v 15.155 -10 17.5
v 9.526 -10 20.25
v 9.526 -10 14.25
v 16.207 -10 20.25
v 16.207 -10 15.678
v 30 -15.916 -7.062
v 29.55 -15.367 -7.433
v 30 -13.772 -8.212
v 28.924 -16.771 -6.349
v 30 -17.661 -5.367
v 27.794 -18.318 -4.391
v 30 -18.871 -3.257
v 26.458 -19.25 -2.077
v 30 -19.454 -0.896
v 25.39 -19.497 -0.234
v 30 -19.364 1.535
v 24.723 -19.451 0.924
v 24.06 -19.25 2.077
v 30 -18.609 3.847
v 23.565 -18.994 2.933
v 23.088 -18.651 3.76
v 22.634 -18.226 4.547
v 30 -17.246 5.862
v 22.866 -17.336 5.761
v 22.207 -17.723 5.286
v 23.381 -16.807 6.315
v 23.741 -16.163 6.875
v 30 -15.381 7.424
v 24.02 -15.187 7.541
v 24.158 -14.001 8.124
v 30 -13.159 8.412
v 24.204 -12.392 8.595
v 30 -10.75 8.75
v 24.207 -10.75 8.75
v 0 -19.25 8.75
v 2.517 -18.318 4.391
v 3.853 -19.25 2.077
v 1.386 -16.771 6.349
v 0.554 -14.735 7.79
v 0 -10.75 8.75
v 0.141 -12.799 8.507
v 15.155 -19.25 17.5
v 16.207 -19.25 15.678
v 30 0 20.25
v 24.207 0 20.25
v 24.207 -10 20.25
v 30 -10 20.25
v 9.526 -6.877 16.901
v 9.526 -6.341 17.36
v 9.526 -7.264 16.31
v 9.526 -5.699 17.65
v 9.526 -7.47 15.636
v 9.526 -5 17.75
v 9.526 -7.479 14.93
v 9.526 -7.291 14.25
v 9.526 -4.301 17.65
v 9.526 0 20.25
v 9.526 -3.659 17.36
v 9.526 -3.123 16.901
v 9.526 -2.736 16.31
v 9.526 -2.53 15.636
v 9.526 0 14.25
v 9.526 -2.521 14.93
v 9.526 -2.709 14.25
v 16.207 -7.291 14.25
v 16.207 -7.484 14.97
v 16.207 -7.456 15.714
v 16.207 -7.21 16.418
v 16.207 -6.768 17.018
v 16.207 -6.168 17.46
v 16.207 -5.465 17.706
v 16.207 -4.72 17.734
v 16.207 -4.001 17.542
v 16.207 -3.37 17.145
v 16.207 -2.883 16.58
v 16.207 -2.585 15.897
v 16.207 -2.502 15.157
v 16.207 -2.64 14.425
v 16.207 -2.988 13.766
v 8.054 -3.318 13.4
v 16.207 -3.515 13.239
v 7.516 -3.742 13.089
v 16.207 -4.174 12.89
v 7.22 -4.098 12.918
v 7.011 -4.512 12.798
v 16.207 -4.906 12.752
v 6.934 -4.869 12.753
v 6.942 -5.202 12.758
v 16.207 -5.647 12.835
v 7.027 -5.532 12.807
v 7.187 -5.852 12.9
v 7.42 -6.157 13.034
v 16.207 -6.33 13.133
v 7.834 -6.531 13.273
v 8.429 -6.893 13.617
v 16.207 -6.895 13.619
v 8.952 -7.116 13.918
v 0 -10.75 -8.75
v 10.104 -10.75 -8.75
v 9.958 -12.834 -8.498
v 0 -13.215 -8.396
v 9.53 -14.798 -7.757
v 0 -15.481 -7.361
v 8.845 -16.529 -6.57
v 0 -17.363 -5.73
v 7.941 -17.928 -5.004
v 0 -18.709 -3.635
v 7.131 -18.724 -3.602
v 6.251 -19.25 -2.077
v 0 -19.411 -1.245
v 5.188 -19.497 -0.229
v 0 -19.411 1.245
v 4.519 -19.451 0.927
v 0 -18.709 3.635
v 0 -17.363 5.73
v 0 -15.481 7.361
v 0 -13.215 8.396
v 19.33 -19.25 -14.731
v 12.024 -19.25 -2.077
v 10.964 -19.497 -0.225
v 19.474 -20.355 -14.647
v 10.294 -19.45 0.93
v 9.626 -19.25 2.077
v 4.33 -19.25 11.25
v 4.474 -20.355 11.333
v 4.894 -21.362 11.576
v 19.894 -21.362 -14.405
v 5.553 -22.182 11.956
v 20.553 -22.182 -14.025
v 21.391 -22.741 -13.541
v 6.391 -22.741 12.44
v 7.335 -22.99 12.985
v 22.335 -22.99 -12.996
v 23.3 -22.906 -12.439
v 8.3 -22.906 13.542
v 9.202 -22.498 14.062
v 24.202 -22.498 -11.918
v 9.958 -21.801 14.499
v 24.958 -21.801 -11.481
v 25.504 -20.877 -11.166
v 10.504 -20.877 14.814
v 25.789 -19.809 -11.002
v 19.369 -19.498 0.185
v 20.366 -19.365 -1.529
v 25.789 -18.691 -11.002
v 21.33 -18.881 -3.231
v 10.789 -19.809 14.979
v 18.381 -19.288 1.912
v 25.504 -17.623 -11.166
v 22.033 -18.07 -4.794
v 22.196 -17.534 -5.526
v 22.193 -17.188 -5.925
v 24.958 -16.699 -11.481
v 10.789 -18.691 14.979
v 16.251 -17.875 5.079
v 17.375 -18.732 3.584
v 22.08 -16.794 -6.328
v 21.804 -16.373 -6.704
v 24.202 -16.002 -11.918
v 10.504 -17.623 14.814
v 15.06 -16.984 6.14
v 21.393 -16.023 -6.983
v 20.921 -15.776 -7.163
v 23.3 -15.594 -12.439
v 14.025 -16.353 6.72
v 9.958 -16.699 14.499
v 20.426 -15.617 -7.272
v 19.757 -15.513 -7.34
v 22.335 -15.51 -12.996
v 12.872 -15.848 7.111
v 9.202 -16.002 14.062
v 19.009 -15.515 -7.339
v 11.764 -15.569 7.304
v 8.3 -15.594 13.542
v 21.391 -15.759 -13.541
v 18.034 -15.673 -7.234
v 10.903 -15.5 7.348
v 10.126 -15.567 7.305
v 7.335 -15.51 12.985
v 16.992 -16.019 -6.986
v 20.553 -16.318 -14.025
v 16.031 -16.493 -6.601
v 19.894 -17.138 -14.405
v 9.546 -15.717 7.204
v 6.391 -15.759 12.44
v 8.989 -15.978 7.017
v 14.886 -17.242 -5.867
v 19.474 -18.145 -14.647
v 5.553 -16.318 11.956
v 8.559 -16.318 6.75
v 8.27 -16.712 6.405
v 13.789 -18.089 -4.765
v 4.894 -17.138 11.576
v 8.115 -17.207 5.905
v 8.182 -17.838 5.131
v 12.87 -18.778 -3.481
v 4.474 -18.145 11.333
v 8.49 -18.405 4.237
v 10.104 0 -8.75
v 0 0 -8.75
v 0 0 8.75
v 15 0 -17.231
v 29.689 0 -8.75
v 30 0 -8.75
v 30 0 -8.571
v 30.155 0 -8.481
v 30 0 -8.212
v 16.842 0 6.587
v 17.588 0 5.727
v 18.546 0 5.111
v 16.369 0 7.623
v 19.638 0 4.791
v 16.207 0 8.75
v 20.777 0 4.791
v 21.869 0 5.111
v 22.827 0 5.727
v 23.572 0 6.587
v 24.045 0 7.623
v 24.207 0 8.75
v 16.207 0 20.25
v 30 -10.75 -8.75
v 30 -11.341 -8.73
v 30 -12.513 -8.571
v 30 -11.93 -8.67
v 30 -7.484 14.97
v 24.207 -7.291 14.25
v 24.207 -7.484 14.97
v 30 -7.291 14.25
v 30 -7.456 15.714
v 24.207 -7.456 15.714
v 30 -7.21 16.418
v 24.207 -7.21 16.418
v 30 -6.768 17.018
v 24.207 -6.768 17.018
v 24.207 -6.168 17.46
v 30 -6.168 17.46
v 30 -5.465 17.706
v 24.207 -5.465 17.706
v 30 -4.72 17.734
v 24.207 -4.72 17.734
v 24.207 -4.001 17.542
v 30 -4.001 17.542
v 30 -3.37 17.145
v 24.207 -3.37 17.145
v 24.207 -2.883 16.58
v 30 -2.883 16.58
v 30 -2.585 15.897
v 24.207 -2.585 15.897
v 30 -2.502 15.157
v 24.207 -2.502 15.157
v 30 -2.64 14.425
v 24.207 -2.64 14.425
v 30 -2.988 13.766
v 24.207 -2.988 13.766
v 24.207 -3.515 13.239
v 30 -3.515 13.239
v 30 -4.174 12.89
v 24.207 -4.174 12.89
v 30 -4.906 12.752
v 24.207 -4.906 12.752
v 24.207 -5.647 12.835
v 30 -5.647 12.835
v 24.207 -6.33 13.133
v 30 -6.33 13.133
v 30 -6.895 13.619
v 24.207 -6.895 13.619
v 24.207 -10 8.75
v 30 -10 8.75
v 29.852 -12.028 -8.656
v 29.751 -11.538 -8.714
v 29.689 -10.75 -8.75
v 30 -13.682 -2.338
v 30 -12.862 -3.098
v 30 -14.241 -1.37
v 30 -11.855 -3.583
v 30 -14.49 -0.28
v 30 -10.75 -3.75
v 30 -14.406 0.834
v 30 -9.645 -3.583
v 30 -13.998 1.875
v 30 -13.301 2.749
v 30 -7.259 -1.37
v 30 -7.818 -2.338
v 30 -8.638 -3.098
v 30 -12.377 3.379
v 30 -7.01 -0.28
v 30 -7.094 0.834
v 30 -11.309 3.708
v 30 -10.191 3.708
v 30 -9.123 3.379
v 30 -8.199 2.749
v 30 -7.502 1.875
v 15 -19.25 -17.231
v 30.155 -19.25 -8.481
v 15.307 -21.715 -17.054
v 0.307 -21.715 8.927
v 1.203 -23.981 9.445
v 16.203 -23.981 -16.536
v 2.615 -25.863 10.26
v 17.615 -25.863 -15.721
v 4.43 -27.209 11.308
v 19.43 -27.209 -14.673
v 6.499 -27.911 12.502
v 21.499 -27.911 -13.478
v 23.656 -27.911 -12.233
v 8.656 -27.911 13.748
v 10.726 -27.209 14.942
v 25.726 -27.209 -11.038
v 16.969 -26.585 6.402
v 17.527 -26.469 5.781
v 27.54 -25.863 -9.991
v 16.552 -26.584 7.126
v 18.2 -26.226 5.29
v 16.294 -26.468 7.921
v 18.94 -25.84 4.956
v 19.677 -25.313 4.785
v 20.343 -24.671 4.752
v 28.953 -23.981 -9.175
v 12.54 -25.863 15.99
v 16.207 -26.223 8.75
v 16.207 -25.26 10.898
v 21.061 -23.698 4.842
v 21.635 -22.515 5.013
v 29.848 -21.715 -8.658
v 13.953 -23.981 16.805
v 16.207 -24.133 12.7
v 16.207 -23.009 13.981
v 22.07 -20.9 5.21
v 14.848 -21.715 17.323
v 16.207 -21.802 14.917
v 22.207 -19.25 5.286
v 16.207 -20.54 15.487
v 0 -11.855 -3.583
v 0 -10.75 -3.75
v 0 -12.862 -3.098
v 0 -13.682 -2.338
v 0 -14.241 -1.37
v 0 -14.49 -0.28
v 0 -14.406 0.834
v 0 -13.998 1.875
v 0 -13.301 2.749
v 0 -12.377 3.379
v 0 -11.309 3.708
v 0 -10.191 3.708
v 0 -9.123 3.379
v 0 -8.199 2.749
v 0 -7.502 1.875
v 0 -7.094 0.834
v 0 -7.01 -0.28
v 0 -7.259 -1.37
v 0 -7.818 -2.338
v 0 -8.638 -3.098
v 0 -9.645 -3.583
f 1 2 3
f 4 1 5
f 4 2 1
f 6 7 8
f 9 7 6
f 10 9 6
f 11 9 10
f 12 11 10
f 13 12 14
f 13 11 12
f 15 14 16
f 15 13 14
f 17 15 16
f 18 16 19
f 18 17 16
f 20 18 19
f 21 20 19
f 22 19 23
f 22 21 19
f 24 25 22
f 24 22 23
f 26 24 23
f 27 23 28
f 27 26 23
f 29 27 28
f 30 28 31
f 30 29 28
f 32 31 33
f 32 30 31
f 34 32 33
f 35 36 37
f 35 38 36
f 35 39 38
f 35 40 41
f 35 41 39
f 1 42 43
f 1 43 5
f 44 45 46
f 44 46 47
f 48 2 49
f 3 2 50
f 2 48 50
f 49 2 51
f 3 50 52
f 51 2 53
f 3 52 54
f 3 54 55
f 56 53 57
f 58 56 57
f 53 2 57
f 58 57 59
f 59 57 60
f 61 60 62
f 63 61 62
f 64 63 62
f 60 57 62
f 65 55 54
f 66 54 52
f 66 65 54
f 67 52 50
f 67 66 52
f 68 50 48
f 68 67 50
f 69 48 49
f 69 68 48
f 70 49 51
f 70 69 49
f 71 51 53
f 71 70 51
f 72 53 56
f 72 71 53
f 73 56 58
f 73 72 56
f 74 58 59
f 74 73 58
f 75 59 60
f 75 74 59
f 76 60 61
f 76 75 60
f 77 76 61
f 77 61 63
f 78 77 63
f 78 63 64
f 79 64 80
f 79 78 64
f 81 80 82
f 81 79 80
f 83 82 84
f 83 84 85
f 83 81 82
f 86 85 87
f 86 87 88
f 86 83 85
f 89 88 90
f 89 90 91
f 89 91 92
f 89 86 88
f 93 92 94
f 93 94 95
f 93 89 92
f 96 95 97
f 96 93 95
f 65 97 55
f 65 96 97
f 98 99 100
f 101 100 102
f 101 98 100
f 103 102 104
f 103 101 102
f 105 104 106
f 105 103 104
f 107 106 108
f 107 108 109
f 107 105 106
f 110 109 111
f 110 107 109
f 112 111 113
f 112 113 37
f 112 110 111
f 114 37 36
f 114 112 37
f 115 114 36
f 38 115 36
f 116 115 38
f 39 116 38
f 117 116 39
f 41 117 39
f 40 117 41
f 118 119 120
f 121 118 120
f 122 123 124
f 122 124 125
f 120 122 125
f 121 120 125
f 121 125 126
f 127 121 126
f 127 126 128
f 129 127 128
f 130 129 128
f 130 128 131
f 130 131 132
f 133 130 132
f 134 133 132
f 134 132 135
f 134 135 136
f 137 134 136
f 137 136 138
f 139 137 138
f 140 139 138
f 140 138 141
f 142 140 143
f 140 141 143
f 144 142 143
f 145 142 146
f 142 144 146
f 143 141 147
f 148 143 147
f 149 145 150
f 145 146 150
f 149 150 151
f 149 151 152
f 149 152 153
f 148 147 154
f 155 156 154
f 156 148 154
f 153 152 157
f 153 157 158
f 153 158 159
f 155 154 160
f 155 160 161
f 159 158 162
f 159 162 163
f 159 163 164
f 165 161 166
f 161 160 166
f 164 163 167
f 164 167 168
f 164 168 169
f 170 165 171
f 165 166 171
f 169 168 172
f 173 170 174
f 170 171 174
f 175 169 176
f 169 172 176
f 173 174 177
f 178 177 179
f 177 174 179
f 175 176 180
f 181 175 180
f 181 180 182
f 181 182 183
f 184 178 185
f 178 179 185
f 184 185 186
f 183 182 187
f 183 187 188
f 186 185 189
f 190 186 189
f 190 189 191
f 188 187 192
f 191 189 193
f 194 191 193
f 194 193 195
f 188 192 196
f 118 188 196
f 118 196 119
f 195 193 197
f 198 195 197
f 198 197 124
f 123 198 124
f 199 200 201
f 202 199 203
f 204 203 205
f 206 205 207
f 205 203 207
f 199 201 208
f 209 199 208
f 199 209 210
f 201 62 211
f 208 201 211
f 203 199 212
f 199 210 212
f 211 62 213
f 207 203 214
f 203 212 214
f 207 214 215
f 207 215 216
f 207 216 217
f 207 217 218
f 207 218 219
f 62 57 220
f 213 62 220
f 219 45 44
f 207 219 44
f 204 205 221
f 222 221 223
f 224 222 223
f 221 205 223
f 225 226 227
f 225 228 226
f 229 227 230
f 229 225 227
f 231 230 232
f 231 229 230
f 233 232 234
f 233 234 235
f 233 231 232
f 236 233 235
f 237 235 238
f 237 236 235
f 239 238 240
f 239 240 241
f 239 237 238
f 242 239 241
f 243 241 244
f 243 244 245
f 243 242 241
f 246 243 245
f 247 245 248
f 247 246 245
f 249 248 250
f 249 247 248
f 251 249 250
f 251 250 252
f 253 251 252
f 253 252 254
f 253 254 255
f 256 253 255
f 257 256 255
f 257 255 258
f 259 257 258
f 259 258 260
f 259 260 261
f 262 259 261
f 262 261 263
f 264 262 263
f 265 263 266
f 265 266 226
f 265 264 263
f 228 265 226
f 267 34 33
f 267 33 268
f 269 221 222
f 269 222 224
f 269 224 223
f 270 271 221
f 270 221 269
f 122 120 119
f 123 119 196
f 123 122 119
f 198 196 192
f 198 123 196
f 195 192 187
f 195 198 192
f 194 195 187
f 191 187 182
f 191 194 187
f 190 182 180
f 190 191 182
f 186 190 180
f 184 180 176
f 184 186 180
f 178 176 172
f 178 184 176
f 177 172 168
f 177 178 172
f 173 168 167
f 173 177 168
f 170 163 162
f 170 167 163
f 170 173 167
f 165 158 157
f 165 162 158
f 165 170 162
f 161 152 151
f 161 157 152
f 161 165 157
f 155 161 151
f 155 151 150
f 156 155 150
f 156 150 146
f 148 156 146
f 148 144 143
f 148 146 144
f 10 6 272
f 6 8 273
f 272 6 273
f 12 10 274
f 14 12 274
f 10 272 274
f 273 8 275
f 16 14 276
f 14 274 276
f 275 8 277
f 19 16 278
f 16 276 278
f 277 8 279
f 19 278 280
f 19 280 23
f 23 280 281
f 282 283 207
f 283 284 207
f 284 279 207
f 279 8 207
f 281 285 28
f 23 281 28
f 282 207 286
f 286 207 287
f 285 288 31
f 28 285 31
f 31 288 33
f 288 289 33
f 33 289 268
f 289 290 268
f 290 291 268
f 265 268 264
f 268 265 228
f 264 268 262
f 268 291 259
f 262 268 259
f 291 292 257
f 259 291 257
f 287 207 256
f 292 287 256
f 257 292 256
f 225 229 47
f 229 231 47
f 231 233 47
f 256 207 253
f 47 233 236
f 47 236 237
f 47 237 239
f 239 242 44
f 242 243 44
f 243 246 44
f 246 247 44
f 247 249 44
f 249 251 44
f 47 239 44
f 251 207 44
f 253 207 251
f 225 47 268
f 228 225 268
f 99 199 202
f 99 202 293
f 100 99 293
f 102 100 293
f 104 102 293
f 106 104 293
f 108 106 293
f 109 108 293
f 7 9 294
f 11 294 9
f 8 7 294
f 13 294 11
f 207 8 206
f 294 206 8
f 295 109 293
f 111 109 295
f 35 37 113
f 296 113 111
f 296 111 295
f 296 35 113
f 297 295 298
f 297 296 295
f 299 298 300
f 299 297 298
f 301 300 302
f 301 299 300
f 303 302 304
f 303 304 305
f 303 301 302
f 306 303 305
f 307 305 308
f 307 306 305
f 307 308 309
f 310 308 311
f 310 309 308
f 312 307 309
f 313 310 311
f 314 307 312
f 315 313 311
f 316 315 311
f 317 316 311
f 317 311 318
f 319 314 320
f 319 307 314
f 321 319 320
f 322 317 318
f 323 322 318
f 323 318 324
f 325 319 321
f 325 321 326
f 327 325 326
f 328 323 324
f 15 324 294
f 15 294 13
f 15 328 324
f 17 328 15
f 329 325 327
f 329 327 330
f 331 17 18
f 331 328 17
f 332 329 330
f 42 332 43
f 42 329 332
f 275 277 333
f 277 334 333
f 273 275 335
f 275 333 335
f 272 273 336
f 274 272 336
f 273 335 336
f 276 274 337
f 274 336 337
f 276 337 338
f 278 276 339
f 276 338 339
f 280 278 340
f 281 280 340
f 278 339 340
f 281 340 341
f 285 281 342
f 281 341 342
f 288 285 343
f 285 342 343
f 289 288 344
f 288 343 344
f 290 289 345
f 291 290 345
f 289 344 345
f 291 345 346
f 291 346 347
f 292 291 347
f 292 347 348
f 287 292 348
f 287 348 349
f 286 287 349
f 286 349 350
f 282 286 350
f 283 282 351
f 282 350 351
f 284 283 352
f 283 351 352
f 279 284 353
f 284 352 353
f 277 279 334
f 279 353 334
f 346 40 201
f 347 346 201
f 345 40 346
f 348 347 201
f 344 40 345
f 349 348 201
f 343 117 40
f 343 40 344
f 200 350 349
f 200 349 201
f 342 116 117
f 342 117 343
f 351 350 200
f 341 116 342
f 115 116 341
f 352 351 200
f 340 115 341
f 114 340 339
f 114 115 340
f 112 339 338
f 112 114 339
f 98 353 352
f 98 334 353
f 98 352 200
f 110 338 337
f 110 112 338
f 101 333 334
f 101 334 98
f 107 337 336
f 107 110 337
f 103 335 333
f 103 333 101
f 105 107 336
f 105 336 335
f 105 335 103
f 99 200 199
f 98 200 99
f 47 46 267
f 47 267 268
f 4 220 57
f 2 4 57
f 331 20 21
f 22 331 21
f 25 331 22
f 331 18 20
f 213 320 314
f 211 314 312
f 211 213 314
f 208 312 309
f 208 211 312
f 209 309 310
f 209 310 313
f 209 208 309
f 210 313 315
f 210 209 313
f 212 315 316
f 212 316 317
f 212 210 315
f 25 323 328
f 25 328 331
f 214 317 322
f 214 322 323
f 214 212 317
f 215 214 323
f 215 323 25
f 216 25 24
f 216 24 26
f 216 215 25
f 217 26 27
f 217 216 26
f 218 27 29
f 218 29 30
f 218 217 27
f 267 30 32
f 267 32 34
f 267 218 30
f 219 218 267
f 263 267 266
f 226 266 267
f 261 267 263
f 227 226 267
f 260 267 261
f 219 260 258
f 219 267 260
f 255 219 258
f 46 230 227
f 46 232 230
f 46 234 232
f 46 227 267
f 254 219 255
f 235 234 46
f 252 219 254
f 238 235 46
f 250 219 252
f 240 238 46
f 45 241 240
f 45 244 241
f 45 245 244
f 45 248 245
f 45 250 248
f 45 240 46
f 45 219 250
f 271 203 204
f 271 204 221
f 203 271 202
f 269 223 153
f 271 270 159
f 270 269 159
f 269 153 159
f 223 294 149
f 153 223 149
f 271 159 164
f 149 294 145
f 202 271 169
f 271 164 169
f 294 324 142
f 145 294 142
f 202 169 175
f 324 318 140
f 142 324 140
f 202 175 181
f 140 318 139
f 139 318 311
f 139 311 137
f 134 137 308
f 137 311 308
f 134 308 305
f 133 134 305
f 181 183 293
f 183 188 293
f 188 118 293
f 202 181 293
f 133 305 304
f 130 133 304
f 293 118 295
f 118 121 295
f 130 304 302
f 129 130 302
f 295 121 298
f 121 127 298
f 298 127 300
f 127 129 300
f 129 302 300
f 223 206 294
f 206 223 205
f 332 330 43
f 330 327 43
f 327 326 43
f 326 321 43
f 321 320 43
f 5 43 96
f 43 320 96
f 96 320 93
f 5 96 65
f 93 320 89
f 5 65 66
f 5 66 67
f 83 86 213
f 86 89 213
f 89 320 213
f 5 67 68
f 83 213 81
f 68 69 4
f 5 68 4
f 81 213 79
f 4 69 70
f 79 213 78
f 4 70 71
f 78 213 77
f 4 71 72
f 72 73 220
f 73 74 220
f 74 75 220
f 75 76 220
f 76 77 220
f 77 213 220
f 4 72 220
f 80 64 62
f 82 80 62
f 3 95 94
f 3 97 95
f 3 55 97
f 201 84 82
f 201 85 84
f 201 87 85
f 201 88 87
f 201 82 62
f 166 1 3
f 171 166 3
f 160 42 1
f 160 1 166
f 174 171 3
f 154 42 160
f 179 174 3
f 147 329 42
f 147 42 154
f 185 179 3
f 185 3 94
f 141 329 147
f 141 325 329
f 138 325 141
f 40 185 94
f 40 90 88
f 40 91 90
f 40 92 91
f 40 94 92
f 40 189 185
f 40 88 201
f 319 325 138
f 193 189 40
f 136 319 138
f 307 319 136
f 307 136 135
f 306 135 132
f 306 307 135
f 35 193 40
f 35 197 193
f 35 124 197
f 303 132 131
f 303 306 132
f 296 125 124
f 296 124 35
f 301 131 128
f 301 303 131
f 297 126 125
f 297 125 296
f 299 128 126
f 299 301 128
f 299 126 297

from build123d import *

# Parameters (mm, degrees)
SKETCH1_R           = 3.75
BOSS_EXTRUDE1_DEPTH = 30
SKETCH2_R           = 3.75
BOSS_EXTRUDE2_DEPTH = 30
CUT_EXTRUDE1_DEPTH  = 29.0000001
SKETCH4_W           = 5.792740578
SKETCH4_H           = 11.5
BOSS_EXTRUDE3_DEPTH = 10
BOSS_EXTRUDE4_DEPTH = 10
SKETCH5_R           = 2.5
CUT_EXTRUDE2_DEPTH  = 31.0000001
SKETCH7_R           = 3.75
CUT_EXTRUDE3_DEPTH  = 31.155444666
SKETCH8_R           = 3.75
CUT_EXTRUDE4_DEPTH  = 38.57772242


with BuildPart() as part:
    # Sketch1 → Boss-Extrude1 (new body)
    with BuildSketch(Plane(origin=(0, 0, 0), x_dir=(0, 0, -1), z_dir=(1, 0, 0))):
        with BuildLine():
            Line((-8.75, 0), (8.75, 0))
            Line((8.75, 0), (8.75, 10.75))
            ThreePointArc((8.75, 10.75), (0, 19.5), (-8.75, 10.75))
            Line((-8.75, 10.75), (-8.75, 0))
        make_face()
        with Locations((0, 10.75)):
            Circle(SKETCH1_R, mode=Mode.SUBTRACT)
    extrude(amount=BOSS_EXTRUDE1_DEPTH)

    # Sketch2 → Boss-Extrude2 (add)
    with BuildSketch(Plane(origin=(-3.788861142, 0, 6.5625), x_dir=(-0.866025404, 0, -0.5), z_dir=(0.5, 0, -0.866025404))):
        with BuildLine():
            Line((-4.375, 0), (-4.375, 19.25))
            ThreePointArc((-4.375, 19.25), (-13.125, 28), (-21.875, 19.25))
            Line((-21.875, 19.25), (-21.875, 0))
            Line((-21.875, 0), (-4.375, 0))
        make_face()
        with Locations((-13.125, 19.25)):
            Circle(SKETCH2_R, mode=Mode.SUBTRACT)
    extrude(amount=BOSS_EXTRUDE2_DEPTH)

    # Sketch3 → Cut-Extrude1 (cut, through all)
    with BuildSketch(Plane.XZ):
        with BuildLine():
            Line((24.207259422, 8.75), (24.207259422, 15.67820323))
            Line((24.207259422, 15.67820323), (16.207259422, 15.67820323))
            Line((16.207259422, 15.67820323), (16.207259422, 8.75))
            ThreePointArc((16.207259422, 8.75), (20.207259422, 4.75), (24.207259422, 8.75))
        make_face()
    extrude(amount=-CUT_EXTRUDE1_DEPTH, mode=Mode.SUBTRACT)

    # Sketch4 → Boss-Extrude3 (add)
    with BuildSketch(Plane.XZ):
        with Locations((27.103629711, 14.5)):
            Rectangle(SKETCH4_W, SKETCH4_H)
    extrude(amount=-BOSS_EXTRUDE3_DEPTH)

    # Sketch6 → Boss-Extrude4 (add)
    with BuildSketch(Plane.XZ):
        Polygon((16.207259422, 15.67820323), (16.207259422, 20.25), (9.526279442, 20.25), (9.526279442, 14.25), align=None)
    extrude(amount=-BOSS_EXTRUDE4_DEPTH)

    # Sketch5 → Cut-Extrude2 (cut, through all)
    with BuildSketch(Plane(origin=(30, 0, 0), x_dir=(0, 0, -1), z_dir=(1, 0, 0))):
        with Locations(Location((-15.25, 5, 0), (0, 0, 66.421821522))):  # turned: the seam where the file's is
            Circle(SKETCH5_R)
    extrude(amount=-CUT_EXTRUDE2_DEPTH, mode=Mode.SUBTRACT)

    # Sketch7 → Cut-Extrude3 (cut, through all)
    with BuildSketch(Plane.ZY):
        with Locations(Location((0, 10.75, 0), (0, 0, 180))):  # turned: the seam where the file's is
            Circle(SKETCH7_R)
    extrude(amount=-CUT_EXTRUDE3_DEPTH, mode=Mode.SUBTRACT)

    # Sketch8 → Cut-Extrude4 (cut, through all)
    with BuildSketch(Plane(origin=(-3.788861142, 0, 6.5625), x_dir=(0.866025404, 0, 0.5), z_dir=(-0.5, 0, 0.866025404))):
        with Locations(Location((13.125, 19.25, 0), (0, 0, 180))):  # turned: the seam where the file's is
            Circle(SKETCH8_R)
    extrude(amount=-CUT_EXTRUDE4_DEPTH, mode=Mode.SUBTRACT)


with BuildPart() as body_2:
    # Mirror1: mirrored copy
    add(part.part.mirror(Plane(origin=(30, 0, 8.75), x_dir=(0, 0, 1), z_dir=(0, 1, 0))))


solid = body_2.part
